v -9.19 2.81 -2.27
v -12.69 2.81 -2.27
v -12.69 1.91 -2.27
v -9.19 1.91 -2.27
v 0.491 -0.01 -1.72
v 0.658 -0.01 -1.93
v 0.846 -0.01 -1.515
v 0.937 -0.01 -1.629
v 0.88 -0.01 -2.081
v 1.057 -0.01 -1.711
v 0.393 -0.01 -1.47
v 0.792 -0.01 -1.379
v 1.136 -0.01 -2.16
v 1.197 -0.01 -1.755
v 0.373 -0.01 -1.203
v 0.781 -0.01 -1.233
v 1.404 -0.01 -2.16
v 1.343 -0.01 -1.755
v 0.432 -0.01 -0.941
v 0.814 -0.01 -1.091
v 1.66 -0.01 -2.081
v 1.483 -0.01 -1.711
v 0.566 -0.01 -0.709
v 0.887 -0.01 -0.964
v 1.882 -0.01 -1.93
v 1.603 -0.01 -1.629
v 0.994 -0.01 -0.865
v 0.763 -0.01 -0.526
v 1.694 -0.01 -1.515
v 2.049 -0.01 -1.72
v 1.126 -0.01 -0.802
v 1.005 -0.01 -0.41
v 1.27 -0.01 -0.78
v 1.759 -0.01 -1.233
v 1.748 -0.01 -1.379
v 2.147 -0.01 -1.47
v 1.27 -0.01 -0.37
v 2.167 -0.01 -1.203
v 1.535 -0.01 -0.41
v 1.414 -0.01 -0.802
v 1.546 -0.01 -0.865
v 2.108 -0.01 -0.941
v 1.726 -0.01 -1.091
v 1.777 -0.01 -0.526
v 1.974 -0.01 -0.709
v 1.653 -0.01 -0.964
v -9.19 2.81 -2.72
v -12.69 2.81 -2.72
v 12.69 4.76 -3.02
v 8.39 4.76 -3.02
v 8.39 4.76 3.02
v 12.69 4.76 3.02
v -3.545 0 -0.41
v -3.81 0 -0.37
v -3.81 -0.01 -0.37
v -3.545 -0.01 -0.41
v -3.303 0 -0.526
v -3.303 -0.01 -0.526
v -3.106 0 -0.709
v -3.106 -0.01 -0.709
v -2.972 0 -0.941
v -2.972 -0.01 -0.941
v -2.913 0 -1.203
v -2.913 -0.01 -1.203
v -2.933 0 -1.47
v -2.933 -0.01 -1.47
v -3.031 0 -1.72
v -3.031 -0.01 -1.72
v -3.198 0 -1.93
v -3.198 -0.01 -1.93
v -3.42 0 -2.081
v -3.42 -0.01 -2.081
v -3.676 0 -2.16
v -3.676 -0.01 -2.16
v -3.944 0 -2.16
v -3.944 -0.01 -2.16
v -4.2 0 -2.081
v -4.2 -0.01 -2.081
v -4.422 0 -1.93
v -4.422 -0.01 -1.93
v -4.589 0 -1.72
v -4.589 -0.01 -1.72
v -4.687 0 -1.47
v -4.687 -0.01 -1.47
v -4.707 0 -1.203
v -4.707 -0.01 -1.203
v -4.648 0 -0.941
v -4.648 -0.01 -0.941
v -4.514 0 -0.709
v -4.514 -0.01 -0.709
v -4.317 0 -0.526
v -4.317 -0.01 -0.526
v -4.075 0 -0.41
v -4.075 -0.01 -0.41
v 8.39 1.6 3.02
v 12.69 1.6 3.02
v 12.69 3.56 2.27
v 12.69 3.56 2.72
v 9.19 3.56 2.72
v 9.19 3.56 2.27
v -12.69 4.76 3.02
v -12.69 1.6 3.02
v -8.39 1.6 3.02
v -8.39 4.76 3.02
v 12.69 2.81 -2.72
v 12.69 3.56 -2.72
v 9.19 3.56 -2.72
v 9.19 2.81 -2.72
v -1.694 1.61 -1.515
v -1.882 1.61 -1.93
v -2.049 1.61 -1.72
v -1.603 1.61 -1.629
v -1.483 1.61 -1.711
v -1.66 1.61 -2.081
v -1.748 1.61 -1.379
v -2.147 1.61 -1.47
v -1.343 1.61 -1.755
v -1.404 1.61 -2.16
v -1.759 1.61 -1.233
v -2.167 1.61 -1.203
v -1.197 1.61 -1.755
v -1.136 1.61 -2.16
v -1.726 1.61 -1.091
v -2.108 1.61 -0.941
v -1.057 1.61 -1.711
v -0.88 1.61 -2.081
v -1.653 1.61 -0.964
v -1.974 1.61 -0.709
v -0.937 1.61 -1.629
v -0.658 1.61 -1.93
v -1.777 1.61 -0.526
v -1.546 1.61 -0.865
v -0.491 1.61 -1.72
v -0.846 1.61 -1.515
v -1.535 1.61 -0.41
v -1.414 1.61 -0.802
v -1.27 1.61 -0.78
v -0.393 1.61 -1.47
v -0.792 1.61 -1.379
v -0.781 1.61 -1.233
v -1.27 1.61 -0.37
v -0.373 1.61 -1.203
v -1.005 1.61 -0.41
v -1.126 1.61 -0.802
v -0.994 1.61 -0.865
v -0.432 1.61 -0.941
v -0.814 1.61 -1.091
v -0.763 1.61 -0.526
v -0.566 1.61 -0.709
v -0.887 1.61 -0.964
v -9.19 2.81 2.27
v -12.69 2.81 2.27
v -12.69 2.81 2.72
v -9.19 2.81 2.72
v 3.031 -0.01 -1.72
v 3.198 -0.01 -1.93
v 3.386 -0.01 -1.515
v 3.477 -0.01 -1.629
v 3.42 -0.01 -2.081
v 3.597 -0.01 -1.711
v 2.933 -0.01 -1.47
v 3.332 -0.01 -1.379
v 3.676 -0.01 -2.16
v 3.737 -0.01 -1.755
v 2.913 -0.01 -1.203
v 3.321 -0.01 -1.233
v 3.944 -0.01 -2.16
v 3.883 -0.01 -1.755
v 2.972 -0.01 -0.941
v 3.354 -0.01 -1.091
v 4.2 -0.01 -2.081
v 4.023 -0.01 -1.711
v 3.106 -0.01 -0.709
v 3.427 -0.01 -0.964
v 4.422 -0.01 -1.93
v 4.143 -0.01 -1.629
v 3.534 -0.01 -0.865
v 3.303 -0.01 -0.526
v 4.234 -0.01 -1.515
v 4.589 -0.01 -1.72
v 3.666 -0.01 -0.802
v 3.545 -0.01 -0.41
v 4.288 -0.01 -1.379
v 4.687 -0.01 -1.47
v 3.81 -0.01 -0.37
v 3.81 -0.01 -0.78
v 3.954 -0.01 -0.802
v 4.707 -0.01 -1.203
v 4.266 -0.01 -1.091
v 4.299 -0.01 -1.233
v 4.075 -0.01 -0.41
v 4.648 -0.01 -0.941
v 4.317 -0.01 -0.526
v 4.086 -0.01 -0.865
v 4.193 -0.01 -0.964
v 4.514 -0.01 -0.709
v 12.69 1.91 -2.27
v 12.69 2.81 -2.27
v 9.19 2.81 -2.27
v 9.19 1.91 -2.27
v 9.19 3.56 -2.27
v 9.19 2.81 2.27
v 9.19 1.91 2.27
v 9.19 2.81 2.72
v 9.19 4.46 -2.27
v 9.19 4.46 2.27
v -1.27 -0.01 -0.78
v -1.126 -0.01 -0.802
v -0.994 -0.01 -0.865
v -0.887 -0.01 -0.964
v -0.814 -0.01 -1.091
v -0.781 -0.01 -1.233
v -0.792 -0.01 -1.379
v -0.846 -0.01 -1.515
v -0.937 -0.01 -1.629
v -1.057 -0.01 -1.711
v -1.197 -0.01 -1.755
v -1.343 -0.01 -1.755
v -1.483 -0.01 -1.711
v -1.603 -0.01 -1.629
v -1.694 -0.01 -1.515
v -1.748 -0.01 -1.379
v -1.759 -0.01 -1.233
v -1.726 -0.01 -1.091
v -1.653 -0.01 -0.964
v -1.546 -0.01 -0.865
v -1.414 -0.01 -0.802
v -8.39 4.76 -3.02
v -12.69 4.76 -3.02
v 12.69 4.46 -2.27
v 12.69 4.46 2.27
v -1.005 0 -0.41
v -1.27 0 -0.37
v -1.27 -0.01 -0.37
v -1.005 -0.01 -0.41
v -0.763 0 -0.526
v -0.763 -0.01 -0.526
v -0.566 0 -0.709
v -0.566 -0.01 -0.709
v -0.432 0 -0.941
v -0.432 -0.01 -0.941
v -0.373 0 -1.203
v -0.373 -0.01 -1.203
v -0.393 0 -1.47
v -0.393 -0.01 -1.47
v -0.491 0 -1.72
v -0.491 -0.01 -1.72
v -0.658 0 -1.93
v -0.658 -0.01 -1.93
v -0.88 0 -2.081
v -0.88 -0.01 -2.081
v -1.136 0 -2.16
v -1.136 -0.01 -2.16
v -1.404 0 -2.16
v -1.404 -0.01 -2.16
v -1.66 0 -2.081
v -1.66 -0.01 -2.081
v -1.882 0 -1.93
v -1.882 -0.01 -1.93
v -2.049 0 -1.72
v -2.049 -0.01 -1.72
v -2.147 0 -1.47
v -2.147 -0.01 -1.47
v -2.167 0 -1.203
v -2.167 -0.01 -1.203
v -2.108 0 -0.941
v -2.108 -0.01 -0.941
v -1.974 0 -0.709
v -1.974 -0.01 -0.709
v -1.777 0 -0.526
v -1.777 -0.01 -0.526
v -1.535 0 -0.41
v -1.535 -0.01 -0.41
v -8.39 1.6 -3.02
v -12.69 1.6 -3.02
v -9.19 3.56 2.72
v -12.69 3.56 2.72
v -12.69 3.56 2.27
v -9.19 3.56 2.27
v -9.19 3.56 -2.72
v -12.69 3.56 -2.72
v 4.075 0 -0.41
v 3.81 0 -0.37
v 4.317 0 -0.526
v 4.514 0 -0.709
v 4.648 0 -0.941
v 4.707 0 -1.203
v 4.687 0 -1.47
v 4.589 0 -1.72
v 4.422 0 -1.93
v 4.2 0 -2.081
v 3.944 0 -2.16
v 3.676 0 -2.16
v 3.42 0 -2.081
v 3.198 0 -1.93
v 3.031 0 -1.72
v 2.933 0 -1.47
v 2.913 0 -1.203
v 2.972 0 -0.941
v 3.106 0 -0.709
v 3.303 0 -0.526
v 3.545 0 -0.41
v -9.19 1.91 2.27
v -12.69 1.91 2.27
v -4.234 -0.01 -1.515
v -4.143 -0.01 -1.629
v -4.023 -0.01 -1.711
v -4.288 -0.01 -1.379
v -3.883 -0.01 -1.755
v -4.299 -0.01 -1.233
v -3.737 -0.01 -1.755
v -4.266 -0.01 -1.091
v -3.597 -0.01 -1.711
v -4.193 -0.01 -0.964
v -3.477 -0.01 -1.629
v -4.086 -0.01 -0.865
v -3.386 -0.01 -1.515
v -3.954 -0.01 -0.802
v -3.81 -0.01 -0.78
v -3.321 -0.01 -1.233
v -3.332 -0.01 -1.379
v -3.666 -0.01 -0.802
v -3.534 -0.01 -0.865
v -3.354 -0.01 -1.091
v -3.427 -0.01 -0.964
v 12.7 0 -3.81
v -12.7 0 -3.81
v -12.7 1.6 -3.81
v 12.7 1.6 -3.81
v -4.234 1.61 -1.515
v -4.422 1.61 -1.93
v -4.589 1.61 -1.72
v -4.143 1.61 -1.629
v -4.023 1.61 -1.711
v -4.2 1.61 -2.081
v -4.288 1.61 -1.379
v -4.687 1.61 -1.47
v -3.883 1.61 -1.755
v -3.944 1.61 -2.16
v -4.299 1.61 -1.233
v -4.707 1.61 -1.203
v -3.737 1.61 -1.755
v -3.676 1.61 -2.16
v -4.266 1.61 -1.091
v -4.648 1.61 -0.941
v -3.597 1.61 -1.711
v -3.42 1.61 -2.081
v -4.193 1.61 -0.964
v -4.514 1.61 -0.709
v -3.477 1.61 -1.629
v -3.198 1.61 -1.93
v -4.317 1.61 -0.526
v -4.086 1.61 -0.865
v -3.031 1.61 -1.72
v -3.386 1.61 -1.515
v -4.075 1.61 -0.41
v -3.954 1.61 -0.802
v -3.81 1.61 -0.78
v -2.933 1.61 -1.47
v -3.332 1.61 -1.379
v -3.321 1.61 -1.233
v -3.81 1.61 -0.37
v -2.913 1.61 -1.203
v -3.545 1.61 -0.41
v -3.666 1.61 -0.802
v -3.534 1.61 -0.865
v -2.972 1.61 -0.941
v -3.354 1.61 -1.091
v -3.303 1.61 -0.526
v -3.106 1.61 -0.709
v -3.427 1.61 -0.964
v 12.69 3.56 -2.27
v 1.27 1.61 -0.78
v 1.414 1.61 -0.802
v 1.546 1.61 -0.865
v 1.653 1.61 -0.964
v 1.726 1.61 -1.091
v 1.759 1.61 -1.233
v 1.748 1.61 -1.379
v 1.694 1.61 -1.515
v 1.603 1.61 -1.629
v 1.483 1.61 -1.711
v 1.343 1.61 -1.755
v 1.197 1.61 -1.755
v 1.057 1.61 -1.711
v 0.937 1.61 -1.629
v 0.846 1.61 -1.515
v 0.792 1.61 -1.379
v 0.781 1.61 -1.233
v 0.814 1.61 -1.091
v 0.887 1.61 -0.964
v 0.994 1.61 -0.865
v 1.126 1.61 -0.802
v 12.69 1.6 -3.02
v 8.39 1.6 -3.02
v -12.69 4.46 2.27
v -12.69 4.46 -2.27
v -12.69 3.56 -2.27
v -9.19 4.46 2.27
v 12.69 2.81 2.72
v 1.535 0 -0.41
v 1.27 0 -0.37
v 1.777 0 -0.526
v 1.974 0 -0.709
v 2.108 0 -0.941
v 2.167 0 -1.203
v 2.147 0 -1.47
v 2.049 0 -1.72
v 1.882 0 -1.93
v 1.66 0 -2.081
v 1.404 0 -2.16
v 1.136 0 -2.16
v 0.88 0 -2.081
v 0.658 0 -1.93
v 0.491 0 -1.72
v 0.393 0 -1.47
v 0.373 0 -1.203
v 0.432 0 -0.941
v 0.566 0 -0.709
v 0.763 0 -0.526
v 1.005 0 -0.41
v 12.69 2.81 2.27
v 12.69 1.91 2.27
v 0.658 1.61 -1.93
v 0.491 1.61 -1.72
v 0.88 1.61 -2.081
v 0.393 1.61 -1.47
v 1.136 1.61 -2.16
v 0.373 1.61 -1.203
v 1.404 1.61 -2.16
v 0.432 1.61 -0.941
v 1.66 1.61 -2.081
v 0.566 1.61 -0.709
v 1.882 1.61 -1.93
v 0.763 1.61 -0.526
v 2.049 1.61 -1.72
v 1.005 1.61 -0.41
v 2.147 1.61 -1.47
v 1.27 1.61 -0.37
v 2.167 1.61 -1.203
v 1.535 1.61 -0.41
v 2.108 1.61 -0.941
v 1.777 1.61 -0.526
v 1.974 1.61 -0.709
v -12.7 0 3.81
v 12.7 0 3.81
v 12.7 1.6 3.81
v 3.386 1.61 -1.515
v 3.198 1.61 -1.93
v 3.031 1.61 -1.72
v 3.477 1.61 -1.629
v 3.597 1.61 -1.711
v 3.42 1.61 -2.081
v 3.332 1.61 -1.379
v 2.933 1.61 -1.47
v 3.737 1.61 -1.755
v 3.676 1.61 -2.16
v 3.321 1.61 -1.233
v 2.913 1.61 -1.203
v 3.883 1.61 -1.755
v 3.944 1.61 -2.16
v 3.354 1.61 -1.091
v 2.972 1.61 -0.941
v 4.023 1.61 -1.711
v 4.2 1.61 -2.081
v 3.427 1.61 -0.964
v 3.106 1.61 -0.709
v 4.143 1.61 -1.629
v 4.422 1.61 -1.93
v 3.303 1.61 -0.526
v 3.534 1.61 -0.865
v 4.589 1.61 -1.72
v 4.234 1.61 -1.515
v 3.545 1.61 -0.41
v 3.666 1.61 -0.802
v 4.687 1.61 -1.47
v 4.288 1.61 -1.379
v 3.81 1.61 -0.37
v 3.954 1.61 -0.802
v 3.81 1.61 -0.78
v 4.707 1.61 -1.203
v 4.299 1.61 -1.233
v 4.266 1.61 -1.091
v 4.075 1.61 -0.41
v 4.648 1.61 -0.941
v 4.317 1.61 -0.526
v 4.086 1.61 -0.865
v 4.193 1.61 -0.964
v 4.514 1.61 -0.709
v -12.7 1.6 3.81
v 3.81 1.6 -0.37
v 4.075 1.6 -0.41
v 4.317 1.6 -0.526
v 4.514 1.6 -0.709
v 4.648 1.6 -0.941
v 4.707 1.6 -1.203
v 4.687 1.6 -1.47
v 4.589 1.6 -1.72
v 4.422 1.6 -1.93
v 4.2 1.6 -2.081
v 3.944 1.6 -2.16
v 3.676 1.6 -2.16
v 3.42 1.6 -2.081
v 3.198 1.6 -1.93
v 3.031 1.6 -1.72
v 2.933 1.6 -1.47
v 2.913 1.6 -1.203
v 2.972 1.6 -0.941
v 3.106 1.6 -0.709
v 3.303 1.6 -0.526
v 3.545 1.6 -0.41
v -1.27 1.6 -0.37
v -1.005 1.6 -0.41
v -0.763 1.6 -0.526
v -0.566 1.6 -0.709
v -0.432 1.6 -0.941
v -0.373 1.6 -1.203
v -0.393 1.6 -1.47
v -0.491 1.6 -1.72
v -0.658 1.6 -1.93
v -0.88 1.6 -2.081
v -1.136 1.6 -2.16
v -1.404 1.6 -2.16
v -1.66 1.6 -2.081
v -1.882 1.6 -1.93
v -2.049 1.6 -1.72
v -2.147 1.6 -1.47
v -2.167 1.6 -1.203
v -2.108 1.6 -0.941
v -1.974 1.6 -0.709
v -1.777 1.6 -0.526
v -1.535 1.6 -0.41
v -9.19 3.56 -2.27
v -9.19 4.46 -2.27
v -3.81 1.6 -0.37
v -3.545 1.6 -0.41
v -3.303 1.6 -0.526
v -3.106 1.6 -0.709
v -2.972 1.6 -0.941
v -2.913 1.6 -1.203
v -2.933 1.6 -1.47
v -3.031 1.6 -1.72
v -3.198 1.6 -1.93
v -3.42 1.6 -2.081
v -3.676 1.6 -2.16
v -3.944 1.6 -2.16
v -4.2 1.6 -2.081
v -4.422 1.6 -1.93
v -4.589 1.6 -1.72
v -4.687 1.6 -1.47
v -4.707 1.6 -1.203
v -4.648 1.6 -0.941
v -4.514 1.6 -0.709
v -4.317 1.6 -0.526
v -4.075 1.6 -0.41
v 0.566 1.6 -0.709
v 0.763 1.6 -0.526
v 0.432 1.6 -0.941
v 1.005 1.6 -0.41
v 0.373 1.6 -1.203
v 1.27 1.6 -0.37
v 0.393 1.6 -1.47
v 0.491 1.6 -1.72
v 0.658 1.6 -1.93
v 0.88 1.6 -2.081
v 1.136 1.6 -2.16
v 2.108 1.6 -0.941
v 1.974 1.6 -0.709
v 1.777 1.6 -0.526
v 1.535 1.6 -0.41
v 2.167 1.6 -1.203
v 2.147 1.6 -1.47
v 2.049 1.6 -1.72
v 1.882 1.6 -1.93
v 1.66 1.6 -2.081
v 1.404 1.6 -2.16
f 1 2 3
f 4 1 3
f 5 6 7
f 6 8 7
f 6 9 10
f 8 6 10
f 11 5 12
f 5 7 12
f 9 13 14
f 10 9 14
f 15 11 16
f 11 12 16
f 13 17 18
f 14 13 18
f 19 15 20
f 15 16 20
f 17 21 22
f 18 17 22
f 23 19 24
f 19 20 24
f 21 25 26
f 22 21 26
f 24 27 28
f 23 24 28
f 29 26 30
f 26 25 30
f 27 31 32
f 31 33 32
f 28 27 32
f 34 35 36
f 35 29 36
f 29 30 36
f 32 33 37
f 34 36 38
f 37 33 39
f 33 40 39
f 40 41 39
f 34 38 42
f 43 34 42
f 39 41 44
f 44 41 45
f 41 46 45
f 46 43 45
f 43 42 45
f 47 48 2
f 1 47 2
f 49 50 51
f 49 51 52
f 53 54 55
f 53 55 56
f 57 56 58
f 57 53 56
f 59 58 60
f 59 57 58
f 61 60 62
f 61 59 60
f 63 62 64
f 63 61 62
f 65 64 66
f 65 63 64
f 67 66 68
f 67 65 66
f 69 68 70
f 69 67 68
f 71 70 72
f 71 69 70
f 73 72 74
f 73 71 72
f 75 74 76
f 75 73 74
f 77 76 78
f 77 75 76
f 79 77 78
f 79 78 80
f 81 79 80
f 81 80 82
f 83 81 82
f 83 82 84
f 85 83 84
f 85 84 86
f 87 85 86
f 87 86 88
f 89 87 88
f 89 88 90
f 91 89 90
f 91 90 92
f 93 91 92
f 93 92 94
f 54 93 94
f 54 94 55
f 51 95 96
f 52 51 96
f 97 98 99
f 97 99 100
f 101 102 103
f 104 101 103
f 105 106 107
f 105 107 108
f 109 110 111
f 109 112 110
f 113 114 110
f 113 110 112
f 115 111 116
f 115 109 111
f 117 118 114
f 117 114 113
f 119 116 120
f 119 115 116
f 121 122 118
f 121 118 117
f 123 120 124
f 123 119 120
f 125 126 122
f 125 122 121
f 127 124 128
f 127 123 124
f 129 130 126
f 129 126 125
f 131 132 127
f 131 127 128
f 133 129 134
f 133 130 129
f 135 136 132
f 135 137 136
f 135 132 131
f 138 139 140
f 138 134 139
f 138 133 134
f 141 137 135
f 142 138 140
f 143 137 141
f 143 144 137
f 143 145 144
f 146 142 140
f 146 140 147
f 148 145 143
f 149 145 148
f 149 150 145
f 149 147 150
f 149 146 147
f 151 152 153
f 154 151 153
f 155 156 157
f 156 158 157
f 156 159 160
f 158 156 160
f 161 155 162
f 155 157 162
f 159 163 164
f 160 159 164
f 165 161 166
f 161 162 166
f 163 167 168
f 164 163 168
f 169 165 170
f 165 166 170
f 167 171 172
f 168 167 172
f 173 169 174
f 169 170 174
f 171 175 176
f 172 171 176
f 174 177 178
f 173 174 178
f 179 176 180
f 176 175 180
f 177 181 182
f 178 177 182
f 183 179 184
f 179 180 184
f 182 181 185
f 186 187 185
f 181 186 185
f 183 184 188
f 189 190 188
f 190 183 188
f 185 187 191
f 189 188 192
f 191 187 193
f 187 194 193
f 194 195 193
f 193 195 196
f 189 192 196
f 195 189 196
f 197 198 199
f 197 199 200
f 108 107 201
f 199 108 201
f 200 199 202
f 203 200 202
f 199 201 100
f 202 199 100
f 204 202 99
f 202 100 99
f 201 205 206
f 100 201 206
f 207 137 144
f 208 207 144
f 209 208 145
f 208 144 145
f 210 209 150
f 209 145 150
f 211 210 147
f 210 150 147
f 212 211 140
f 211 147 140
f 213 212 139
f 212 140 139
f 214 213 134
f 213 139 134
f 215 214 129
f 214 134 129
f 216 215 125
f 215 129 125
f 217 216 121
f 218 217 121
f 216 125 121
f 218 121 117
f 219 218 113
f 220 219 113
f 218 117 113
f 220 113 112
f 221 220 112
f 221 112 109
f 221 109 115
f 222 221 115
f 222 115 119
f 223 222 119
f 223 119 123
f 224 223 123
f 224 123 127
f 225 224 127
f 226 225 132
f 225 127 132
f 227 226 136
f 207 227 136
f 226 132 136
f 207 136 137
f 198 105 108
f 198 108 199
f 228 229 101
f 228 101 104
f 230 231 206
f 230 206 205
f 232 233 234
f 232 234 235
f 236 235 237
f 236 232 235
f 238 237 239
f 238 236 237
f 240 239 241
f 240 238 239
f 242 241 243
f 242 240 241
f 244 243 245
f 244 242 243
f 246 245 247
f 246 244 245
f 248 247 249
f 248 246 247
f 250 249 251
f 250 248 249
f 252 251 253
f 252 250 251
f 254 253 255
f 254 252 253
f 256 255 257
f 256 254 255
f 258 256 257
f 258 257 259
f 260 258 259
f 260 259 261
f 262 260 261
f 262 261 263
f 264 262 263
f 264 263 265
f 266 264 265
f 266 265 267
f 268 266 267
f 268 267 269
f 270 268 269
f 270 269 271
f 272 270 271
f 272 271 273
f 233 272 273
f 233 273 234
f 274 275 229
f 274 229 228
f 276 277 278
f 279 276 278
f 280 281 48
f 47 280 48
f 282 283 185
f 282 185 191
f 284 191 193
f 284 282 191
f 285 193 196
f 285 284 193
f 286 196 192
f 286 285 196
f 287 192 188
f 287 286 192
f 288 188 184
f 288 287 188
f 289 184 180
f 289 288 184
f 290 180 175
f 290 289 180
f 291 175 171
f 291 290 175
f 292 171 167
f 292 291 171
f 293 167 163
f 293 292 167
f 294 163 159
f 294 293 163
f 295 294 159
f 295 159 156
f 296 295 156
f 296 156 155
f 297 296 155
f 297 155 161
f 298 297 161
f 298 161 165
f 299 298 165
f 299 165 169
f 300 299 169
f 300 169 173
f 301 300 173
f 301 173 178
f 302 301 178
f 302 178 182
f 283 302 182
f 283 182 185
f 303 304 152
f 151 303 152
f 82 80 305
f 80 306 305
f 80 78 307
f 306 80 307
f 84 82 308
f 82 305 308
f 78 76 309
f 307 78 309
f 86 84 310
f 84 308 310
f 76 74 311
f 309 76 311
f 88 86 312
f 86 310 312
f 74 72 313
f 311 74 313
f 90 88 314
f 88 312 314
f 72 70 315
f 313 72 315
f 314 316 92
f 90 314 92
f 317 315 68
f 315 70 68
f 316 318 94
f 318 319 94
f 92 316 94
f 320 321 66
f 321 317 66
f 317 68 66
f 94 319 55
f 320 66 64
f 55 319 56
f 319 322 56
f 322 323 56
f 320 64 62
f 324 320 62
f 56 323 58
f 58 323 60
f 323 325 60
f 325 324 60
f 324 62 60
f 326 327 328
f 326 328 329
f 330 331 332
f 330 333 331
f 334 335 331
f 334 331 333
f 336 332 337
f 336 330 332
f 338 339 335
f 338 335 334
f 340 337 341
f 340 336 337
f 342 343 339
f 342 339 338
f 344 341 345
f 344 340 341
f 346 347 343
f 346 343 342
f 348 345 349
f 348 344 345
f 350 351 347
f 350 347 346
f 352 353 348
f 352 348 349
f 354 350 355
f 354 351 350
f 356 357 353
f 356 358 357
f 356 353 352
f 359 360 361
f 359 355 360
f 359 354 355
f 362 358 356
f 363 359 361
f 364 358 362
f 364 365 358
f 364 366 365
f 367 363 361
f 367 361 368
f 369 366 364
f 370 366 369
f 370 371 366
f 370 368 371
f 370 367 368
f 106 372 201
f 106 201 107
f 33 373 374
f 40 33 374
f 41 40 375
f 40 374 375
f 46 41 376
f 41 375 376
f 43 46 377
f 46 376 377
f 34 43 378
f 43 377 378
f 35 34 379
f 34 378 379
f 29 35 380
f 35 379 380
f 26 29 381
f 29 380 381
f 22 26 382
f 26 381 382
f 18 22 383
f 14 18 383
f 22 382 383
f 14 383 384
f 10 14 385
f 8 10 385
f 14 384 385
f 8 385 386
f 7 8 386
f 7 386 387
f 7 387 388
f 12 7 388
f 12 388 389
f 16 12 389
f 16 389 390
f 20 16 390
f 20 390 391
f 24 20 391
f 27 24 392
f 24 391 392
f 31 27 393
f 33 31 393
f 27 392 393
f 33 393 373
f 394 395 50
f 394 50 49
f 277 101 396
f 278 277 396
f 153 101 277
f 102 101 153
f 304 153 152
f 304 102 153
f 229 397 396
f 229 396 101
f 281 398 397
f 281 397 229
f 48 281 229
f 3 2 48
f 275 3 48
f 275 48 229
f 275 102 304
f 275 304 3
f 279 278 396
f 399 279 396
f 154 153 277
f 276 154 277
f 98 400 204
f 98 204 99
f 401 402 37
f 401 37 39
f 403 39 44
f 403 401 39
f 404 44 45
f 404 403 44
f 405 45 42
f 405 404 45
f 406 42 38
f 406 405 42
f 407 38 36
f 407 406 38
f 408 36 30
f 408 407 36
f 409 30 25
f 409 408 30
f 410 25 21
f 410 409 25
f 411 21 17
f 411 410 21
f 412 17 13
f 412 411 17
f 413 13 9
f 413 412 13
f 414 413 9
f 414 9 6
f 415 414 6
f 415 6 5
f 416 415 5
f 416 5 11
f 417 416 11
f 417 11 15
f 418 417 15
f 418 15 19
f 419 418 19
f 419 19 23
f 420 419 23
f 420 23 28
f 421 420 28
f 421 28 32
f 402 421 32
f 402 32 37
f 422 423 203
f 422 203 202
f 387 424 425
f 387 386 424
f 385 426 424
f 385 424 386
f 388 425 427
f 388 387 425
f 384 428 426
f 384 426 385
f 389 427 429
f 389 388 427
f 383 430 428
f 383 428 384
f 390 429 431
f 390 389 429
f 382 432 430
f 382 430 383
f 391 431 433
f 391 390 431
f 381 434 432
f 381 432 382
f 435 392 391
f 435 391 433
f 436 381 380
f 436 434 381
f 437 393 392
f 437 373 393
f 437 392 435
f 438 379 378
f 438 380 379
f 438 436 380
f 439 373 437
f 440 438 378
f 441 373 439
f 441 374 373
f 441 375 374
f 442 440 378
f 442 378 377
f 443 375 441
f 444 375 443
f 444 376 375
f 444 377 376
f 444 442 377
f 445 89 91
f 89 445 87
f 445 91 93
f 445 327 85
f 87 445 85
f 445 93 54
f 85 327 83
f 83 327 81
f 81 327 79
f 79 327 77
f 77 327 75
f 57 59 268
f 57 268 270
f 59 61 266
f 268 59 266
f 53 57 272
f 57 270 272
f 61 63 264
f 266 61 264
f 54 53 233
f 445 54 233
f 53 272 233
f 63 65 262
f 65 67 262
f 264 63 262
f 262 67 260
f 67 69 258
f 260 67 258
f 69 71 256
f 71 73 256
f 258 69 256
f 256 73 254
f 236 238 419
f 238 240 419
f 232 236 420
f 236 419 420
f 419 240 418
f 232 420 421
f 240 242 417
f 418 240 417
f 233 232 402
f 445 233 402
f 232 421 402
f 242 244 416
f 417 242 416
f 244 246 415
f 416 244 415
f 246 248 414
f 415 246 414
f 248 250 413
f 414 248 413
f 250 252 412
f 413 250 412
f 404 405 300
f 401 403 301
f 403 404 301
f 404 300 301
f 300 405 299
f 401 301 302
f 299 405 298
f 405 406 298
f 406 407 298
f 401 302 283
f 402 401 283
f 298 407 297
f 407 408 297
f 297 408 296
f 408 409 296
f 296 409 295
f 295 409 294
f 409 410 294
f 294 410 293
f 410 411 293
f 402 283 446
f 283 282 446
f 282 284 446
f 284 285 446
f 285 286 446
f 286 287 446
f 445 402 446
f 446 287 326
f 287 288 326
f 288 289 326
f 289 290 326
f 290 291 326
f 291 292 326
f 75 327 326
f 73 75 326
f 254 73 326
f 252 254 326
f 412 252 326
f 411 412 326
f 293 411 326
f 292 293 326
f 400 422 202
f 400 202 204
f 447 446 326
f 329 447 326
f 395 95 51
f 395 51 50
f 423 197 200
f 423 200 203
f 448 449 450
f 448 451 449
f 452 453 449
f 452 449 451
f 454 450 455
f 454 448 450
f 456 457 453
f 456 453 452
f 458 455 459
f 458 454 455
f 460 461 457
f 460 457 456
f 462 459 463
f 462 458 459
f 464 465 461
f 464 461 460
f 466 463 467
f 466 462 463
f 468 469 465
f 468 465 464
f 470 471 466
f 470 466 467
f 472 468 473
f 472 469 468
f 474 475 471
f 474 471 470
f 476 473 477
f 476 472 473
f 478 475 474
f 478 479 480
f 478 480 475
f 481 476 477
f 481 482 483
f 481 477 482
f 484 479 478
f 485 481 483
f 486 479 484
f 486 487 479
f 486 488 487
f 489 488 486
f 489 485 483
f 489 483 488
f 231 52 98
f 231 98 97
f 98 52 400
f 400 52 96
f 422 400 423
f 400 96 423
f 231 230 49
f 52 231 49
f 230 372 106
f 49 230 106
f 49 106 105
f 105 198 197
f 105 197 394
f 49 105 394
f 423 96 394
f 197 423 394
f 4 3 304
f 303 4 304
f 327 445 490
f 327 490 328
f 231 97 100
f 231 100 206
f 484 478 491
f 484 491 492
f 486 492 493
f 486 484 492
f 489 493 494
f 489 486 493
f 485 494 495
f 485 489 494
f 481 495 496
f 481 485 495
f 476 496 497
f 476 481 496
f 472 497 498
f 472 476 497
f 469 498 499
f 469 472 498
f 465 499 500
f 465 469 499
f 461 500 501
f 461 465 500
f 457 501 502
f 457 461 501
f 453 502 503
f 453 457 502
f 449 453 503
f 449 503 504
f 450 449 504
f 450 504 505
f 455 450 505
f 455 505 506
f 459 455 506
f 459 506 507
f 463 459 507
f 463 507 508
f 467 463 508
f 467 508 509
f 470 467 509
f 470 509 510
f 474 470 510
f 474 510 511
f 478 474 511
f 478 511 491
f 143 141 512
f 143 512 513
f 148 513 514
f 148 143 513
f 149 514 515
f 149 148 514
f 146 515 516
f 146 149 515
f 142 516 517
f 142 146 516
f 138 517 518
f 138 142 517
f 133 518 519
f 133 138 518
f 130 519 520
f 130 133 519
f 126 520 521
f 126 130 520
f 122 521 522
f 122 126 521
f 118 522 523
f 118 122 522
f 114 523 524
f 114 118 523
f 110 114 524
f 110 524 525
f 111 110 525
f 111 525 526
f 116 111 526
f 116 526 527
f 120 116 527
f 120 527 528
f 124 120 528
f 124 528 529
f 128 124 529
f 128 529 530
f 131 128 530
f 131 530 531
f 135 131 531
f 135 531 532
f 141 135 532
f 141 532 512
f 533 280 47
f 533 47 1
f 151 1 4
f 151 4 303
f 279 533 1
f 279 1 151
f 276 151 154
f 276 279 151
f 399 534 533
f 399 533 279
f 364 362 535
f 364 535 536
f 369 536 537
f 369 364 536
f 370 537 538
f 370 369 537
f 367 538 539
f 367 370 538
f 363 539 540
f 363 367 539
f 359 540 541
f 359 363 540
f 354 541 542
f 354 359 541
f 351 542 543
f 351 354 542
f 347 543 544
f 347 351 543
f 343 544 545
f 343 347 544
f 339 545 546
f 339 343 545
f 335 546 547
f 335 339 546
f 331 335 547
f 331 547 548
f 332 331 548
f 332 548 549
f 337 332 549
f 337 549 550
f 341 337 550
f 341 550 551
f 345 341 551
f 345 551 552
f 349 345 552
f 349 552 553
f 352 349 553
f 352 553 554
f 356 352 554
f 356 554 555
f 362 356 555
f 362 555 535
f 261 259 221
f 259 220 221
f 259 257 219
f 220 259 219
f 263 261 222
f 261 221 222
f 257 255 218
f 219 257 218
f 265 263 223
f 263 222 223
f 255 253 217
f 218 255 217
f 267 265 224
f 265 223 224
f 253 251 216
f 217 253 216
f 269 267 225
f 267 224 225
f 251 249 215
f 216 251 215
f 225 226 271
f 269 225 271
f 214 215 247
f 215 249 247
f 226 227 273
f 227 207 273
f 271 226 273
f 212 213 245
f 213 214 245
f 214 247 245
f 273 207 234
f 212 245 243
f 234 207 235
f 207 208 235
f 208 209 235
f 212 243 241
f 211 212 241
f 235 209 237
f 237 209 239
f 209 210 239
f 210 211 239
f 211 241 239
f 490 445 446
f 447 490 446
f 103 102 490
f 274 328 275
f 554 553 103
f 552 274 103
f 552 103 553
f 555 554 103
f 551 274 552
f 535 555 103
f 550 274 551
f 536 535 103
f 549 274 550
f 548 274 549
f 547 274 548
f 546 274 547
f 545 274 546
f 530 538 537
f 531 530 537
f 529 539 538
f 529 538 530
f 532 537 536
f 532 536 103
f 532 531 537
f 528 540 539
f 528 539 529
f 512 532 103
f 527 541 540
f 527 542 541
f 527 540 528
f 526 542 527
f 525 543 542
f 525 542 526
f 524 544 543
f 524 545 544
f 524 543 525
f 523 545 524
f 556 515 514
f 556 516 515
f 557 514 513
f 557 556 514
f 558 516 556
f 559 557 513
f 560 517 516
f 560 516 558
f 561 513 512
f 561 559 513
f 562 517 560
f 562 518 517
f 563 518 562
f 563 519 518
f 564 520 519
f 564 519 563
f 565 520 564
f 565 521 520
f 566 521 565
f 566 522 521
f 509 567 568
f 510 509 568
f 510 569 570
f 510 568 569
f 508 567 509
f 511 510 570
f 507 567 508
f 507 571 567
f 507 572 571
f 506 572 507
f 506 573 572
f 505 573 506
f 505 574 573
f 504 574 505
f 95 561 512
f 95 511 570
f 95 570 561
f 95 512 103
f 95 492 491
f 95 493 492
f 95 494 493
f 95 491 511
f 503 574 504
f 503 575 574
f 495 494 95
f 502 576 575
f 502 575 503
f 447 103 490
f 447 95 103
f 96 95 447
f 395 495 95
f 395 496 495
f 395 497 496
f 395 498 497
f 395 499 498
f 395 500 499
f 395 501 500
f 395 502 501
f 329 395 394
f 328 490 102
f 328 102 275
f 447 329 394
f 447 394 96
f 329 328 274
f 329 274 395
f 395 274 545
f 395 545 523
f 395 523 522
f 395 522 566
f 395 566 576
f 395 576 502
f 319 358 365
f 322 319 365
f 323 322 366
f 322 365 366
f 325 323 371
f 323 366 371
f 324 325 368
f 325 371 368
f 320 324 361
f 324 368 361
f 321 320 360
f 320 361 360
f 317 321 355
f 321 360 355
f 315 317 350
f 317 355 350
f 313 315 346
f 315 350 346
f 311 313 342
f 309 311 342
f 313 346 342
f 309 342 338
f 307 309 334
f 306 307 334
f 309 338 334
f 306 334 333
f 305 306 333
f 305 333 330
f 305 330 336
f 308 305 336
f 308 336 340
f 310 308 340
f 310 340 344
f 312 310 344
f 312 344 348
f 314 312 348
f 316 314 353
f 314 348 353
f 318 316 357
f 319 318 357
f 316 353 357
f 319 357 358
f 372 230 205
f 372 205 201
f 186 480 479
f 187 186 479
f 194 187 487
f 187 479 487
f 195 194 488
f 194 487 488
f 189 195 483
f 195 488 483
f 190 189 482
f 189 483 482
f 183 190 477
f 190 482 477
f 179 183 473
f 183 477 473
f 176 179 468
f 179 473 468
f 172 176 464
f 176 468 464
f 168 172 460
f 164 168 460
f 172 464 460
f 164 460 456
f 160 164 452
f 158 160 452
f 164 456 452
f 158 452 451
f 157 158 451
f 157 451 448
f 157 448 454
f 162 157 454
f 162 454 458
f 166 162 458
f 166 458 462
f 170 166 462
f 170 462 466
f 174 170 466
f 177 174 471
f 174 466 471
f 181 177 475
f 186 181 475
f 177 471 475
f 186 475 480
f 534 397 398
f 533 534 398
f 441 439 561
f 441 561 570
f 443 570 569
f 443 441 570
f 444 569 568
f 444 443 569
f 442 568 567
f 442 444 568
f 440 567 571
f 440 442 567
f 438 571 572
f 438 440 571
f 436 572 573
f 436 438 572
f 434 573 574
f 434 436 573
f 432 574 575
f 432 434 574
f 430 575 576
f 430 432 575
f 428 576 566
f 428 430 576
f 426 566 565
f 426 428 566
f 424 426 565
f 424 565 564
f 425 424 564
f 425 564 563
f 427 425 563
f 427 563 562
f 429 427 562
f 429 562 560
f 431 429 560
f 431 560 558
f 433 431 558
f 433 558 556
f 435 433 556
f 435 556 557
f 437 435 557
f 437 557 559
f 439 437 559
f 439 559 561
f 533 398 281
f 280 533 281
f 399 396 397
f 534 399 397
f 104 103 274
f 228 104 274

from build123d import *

# Parameters (mm, degrees)
SKETCH1_W           = 25.4
SKETCH1_H           = 7.62
SKETCH1_R           = 0.5
BOSS_EXTRUDE1_DEPTH = 1.6
SKETCH2_R           = 0.9
SKETCH2_R_2         = 0.49
BOSS_EXTRUDE2_DEPTH = 1.62
SKETCH3_W           = 4.3
SKETCH3_H           = 6.04
BOSS_EXTRUDE3_DEPTH = 3.16
CUT_EXTRUDE1_DEPTH  = 3.5


with BuildPart() as part:
    # Sketch1 → Boss-Extrude1 (new body)
    with BuildSketch(Plane(origin=(0, 0, 0), x_dir=(1, 0, 0), z_dir=(0, 1, 0))):
        Rectangle(SKETCH1_W, SKETCH1_H)
        with Locations(Location((-3.81, 1.27, 0), (0, 0, 270))):
            Circle(SKETCH1_R, mode=Mode.SUBTRACT)
        with Locations(Location((-1.27, 1.27, 0), (0, 0, 270))):
            Circle(SKETCH1_R, mode=Mode.SUBTRACT)
        with Locations(Location((1.27, 1.27, 0), (0, 0, 270))):
            Circle(SKETCH1_R, mode=Mode.SUBTRACT)
        with Locations(Location((3.81, 1.27, 0), (0, 0, 270))):
            Circle(SKETCH1_R, mode=Mode.SUBTRACT)
    extrude(amount=BOSS_EXTRUDE1_DEPTH)

    # Sketch2 → Boss-Extrude2 (add)
    # profile 1 of 4: a face of its own
    with BuildSketch(Plane(origin=(0, 1.61, 0), x_dir=(1, 0, 0), z_dir=(0, 1, 0))):
        with Locations(Location((-3.81, 1.27, 0), (0, 0, 270))):
            Circle(SKETCH2_R)
        with Locations(Location((-3.81, 1.27, 0), (0, 0, 270))):
            Circle(SKETCH2_R_2, mode=Mode.SUBTRACT)
    # profile 2 of 4: a face of its own
    with BuildSketch(Plane(origin=(0, 1.61, 0), x_dir=(1, 0, 0), z_dir=(0, 1, 0))):
        with Locations(Location((1.27, 1.27, 0), (0, 0, 270))):
            Circle(SKETCH2_R)
        with Locations(Location((1.27, 1.27, 0), (0, 0, 270))):
            Circle(SKETCH2_R_2, mode=Mode.SUBTRACT)
    # profile 3 of 4: a face of its own
    with BuildSketch(Plane(origin=(0, 1.61, 0), x_dir=(1, 0, 0), z_dir=(0, 1, 0))):
        with Locations(Location((-1.27, 1.27, 0), (0, 0, 270))):
            Circle(SKETCH2_R)
        with Locations(Location((-1.27, 1.27, 0), (0, 0, 270))):
            Circle(SKETCH2_R_2, mode=Mode.SUBTRACT)
    # profile 4 of 4: a face of its own
    with BuildSketch(Plane(origin=(0, 1.61, 0), x_dir=(1, 0, 0), z_dir=(0, 1, 0))):
        with Locations(Location((3.81, 1.27, 0), (0, 0, 270))):
            Circle(SKETCH2_R)
        with Locations(Location((3.81, 1.27, 0), (0, 0, 270))):
            Circle(SKETCH2_R_2, mode=Mode.SUBTRACT)
    extrude(amount=-BOSS_EXTRUDE2_DEPTH)

    # Sketch3 → Boss-Extrude3 (add)
    with BuildSketch(Plane(origin=(0, 1.6, 0), x_dir=(1, 0, 0), z_dir=(0, 1, 0))):
        with Locations((-10.54, 0)):
            Rectangle(SKETCH3_W, SKETCH3_H)
        with Locations((10.54, 0)):
            Rectangle(SKETCH3_W, SKETCH3_H)
    extrude(amount=BOSS_EXTRUDE3_DEPTH)

    # Sketch4 → Cut-Extrude1 (cut)
    with BuildSketch(Plane.ZY.offset(12.69)):
        Polygon((2.27, 4.46), (-2.27, 4.46), (-2.27, 3.56), (-2.72, 3.56), (-2.72, 2.81), (-2.27, 2.81), (-2.27, 1.91), (2.27, 1.91), (2.27, 2.81), (2.72, 2.81), (2.72, 3.56), (2.27, 3.56), align=None)
    cut_extrude1 = extrude(amount=-CUT_EXTRUDE1_DEPTH, mode=Mode.SUBTRACT)

    # Mirror1: Cut-Extrude1 across plane
    add(cut_extrude1.mirror(Plane(origin=(0, 0, 0), x_dir=(0, 0, 1), z_dir=(1, 0, 0))), mode=Mode.SUBTRACT)


solid = part.part
